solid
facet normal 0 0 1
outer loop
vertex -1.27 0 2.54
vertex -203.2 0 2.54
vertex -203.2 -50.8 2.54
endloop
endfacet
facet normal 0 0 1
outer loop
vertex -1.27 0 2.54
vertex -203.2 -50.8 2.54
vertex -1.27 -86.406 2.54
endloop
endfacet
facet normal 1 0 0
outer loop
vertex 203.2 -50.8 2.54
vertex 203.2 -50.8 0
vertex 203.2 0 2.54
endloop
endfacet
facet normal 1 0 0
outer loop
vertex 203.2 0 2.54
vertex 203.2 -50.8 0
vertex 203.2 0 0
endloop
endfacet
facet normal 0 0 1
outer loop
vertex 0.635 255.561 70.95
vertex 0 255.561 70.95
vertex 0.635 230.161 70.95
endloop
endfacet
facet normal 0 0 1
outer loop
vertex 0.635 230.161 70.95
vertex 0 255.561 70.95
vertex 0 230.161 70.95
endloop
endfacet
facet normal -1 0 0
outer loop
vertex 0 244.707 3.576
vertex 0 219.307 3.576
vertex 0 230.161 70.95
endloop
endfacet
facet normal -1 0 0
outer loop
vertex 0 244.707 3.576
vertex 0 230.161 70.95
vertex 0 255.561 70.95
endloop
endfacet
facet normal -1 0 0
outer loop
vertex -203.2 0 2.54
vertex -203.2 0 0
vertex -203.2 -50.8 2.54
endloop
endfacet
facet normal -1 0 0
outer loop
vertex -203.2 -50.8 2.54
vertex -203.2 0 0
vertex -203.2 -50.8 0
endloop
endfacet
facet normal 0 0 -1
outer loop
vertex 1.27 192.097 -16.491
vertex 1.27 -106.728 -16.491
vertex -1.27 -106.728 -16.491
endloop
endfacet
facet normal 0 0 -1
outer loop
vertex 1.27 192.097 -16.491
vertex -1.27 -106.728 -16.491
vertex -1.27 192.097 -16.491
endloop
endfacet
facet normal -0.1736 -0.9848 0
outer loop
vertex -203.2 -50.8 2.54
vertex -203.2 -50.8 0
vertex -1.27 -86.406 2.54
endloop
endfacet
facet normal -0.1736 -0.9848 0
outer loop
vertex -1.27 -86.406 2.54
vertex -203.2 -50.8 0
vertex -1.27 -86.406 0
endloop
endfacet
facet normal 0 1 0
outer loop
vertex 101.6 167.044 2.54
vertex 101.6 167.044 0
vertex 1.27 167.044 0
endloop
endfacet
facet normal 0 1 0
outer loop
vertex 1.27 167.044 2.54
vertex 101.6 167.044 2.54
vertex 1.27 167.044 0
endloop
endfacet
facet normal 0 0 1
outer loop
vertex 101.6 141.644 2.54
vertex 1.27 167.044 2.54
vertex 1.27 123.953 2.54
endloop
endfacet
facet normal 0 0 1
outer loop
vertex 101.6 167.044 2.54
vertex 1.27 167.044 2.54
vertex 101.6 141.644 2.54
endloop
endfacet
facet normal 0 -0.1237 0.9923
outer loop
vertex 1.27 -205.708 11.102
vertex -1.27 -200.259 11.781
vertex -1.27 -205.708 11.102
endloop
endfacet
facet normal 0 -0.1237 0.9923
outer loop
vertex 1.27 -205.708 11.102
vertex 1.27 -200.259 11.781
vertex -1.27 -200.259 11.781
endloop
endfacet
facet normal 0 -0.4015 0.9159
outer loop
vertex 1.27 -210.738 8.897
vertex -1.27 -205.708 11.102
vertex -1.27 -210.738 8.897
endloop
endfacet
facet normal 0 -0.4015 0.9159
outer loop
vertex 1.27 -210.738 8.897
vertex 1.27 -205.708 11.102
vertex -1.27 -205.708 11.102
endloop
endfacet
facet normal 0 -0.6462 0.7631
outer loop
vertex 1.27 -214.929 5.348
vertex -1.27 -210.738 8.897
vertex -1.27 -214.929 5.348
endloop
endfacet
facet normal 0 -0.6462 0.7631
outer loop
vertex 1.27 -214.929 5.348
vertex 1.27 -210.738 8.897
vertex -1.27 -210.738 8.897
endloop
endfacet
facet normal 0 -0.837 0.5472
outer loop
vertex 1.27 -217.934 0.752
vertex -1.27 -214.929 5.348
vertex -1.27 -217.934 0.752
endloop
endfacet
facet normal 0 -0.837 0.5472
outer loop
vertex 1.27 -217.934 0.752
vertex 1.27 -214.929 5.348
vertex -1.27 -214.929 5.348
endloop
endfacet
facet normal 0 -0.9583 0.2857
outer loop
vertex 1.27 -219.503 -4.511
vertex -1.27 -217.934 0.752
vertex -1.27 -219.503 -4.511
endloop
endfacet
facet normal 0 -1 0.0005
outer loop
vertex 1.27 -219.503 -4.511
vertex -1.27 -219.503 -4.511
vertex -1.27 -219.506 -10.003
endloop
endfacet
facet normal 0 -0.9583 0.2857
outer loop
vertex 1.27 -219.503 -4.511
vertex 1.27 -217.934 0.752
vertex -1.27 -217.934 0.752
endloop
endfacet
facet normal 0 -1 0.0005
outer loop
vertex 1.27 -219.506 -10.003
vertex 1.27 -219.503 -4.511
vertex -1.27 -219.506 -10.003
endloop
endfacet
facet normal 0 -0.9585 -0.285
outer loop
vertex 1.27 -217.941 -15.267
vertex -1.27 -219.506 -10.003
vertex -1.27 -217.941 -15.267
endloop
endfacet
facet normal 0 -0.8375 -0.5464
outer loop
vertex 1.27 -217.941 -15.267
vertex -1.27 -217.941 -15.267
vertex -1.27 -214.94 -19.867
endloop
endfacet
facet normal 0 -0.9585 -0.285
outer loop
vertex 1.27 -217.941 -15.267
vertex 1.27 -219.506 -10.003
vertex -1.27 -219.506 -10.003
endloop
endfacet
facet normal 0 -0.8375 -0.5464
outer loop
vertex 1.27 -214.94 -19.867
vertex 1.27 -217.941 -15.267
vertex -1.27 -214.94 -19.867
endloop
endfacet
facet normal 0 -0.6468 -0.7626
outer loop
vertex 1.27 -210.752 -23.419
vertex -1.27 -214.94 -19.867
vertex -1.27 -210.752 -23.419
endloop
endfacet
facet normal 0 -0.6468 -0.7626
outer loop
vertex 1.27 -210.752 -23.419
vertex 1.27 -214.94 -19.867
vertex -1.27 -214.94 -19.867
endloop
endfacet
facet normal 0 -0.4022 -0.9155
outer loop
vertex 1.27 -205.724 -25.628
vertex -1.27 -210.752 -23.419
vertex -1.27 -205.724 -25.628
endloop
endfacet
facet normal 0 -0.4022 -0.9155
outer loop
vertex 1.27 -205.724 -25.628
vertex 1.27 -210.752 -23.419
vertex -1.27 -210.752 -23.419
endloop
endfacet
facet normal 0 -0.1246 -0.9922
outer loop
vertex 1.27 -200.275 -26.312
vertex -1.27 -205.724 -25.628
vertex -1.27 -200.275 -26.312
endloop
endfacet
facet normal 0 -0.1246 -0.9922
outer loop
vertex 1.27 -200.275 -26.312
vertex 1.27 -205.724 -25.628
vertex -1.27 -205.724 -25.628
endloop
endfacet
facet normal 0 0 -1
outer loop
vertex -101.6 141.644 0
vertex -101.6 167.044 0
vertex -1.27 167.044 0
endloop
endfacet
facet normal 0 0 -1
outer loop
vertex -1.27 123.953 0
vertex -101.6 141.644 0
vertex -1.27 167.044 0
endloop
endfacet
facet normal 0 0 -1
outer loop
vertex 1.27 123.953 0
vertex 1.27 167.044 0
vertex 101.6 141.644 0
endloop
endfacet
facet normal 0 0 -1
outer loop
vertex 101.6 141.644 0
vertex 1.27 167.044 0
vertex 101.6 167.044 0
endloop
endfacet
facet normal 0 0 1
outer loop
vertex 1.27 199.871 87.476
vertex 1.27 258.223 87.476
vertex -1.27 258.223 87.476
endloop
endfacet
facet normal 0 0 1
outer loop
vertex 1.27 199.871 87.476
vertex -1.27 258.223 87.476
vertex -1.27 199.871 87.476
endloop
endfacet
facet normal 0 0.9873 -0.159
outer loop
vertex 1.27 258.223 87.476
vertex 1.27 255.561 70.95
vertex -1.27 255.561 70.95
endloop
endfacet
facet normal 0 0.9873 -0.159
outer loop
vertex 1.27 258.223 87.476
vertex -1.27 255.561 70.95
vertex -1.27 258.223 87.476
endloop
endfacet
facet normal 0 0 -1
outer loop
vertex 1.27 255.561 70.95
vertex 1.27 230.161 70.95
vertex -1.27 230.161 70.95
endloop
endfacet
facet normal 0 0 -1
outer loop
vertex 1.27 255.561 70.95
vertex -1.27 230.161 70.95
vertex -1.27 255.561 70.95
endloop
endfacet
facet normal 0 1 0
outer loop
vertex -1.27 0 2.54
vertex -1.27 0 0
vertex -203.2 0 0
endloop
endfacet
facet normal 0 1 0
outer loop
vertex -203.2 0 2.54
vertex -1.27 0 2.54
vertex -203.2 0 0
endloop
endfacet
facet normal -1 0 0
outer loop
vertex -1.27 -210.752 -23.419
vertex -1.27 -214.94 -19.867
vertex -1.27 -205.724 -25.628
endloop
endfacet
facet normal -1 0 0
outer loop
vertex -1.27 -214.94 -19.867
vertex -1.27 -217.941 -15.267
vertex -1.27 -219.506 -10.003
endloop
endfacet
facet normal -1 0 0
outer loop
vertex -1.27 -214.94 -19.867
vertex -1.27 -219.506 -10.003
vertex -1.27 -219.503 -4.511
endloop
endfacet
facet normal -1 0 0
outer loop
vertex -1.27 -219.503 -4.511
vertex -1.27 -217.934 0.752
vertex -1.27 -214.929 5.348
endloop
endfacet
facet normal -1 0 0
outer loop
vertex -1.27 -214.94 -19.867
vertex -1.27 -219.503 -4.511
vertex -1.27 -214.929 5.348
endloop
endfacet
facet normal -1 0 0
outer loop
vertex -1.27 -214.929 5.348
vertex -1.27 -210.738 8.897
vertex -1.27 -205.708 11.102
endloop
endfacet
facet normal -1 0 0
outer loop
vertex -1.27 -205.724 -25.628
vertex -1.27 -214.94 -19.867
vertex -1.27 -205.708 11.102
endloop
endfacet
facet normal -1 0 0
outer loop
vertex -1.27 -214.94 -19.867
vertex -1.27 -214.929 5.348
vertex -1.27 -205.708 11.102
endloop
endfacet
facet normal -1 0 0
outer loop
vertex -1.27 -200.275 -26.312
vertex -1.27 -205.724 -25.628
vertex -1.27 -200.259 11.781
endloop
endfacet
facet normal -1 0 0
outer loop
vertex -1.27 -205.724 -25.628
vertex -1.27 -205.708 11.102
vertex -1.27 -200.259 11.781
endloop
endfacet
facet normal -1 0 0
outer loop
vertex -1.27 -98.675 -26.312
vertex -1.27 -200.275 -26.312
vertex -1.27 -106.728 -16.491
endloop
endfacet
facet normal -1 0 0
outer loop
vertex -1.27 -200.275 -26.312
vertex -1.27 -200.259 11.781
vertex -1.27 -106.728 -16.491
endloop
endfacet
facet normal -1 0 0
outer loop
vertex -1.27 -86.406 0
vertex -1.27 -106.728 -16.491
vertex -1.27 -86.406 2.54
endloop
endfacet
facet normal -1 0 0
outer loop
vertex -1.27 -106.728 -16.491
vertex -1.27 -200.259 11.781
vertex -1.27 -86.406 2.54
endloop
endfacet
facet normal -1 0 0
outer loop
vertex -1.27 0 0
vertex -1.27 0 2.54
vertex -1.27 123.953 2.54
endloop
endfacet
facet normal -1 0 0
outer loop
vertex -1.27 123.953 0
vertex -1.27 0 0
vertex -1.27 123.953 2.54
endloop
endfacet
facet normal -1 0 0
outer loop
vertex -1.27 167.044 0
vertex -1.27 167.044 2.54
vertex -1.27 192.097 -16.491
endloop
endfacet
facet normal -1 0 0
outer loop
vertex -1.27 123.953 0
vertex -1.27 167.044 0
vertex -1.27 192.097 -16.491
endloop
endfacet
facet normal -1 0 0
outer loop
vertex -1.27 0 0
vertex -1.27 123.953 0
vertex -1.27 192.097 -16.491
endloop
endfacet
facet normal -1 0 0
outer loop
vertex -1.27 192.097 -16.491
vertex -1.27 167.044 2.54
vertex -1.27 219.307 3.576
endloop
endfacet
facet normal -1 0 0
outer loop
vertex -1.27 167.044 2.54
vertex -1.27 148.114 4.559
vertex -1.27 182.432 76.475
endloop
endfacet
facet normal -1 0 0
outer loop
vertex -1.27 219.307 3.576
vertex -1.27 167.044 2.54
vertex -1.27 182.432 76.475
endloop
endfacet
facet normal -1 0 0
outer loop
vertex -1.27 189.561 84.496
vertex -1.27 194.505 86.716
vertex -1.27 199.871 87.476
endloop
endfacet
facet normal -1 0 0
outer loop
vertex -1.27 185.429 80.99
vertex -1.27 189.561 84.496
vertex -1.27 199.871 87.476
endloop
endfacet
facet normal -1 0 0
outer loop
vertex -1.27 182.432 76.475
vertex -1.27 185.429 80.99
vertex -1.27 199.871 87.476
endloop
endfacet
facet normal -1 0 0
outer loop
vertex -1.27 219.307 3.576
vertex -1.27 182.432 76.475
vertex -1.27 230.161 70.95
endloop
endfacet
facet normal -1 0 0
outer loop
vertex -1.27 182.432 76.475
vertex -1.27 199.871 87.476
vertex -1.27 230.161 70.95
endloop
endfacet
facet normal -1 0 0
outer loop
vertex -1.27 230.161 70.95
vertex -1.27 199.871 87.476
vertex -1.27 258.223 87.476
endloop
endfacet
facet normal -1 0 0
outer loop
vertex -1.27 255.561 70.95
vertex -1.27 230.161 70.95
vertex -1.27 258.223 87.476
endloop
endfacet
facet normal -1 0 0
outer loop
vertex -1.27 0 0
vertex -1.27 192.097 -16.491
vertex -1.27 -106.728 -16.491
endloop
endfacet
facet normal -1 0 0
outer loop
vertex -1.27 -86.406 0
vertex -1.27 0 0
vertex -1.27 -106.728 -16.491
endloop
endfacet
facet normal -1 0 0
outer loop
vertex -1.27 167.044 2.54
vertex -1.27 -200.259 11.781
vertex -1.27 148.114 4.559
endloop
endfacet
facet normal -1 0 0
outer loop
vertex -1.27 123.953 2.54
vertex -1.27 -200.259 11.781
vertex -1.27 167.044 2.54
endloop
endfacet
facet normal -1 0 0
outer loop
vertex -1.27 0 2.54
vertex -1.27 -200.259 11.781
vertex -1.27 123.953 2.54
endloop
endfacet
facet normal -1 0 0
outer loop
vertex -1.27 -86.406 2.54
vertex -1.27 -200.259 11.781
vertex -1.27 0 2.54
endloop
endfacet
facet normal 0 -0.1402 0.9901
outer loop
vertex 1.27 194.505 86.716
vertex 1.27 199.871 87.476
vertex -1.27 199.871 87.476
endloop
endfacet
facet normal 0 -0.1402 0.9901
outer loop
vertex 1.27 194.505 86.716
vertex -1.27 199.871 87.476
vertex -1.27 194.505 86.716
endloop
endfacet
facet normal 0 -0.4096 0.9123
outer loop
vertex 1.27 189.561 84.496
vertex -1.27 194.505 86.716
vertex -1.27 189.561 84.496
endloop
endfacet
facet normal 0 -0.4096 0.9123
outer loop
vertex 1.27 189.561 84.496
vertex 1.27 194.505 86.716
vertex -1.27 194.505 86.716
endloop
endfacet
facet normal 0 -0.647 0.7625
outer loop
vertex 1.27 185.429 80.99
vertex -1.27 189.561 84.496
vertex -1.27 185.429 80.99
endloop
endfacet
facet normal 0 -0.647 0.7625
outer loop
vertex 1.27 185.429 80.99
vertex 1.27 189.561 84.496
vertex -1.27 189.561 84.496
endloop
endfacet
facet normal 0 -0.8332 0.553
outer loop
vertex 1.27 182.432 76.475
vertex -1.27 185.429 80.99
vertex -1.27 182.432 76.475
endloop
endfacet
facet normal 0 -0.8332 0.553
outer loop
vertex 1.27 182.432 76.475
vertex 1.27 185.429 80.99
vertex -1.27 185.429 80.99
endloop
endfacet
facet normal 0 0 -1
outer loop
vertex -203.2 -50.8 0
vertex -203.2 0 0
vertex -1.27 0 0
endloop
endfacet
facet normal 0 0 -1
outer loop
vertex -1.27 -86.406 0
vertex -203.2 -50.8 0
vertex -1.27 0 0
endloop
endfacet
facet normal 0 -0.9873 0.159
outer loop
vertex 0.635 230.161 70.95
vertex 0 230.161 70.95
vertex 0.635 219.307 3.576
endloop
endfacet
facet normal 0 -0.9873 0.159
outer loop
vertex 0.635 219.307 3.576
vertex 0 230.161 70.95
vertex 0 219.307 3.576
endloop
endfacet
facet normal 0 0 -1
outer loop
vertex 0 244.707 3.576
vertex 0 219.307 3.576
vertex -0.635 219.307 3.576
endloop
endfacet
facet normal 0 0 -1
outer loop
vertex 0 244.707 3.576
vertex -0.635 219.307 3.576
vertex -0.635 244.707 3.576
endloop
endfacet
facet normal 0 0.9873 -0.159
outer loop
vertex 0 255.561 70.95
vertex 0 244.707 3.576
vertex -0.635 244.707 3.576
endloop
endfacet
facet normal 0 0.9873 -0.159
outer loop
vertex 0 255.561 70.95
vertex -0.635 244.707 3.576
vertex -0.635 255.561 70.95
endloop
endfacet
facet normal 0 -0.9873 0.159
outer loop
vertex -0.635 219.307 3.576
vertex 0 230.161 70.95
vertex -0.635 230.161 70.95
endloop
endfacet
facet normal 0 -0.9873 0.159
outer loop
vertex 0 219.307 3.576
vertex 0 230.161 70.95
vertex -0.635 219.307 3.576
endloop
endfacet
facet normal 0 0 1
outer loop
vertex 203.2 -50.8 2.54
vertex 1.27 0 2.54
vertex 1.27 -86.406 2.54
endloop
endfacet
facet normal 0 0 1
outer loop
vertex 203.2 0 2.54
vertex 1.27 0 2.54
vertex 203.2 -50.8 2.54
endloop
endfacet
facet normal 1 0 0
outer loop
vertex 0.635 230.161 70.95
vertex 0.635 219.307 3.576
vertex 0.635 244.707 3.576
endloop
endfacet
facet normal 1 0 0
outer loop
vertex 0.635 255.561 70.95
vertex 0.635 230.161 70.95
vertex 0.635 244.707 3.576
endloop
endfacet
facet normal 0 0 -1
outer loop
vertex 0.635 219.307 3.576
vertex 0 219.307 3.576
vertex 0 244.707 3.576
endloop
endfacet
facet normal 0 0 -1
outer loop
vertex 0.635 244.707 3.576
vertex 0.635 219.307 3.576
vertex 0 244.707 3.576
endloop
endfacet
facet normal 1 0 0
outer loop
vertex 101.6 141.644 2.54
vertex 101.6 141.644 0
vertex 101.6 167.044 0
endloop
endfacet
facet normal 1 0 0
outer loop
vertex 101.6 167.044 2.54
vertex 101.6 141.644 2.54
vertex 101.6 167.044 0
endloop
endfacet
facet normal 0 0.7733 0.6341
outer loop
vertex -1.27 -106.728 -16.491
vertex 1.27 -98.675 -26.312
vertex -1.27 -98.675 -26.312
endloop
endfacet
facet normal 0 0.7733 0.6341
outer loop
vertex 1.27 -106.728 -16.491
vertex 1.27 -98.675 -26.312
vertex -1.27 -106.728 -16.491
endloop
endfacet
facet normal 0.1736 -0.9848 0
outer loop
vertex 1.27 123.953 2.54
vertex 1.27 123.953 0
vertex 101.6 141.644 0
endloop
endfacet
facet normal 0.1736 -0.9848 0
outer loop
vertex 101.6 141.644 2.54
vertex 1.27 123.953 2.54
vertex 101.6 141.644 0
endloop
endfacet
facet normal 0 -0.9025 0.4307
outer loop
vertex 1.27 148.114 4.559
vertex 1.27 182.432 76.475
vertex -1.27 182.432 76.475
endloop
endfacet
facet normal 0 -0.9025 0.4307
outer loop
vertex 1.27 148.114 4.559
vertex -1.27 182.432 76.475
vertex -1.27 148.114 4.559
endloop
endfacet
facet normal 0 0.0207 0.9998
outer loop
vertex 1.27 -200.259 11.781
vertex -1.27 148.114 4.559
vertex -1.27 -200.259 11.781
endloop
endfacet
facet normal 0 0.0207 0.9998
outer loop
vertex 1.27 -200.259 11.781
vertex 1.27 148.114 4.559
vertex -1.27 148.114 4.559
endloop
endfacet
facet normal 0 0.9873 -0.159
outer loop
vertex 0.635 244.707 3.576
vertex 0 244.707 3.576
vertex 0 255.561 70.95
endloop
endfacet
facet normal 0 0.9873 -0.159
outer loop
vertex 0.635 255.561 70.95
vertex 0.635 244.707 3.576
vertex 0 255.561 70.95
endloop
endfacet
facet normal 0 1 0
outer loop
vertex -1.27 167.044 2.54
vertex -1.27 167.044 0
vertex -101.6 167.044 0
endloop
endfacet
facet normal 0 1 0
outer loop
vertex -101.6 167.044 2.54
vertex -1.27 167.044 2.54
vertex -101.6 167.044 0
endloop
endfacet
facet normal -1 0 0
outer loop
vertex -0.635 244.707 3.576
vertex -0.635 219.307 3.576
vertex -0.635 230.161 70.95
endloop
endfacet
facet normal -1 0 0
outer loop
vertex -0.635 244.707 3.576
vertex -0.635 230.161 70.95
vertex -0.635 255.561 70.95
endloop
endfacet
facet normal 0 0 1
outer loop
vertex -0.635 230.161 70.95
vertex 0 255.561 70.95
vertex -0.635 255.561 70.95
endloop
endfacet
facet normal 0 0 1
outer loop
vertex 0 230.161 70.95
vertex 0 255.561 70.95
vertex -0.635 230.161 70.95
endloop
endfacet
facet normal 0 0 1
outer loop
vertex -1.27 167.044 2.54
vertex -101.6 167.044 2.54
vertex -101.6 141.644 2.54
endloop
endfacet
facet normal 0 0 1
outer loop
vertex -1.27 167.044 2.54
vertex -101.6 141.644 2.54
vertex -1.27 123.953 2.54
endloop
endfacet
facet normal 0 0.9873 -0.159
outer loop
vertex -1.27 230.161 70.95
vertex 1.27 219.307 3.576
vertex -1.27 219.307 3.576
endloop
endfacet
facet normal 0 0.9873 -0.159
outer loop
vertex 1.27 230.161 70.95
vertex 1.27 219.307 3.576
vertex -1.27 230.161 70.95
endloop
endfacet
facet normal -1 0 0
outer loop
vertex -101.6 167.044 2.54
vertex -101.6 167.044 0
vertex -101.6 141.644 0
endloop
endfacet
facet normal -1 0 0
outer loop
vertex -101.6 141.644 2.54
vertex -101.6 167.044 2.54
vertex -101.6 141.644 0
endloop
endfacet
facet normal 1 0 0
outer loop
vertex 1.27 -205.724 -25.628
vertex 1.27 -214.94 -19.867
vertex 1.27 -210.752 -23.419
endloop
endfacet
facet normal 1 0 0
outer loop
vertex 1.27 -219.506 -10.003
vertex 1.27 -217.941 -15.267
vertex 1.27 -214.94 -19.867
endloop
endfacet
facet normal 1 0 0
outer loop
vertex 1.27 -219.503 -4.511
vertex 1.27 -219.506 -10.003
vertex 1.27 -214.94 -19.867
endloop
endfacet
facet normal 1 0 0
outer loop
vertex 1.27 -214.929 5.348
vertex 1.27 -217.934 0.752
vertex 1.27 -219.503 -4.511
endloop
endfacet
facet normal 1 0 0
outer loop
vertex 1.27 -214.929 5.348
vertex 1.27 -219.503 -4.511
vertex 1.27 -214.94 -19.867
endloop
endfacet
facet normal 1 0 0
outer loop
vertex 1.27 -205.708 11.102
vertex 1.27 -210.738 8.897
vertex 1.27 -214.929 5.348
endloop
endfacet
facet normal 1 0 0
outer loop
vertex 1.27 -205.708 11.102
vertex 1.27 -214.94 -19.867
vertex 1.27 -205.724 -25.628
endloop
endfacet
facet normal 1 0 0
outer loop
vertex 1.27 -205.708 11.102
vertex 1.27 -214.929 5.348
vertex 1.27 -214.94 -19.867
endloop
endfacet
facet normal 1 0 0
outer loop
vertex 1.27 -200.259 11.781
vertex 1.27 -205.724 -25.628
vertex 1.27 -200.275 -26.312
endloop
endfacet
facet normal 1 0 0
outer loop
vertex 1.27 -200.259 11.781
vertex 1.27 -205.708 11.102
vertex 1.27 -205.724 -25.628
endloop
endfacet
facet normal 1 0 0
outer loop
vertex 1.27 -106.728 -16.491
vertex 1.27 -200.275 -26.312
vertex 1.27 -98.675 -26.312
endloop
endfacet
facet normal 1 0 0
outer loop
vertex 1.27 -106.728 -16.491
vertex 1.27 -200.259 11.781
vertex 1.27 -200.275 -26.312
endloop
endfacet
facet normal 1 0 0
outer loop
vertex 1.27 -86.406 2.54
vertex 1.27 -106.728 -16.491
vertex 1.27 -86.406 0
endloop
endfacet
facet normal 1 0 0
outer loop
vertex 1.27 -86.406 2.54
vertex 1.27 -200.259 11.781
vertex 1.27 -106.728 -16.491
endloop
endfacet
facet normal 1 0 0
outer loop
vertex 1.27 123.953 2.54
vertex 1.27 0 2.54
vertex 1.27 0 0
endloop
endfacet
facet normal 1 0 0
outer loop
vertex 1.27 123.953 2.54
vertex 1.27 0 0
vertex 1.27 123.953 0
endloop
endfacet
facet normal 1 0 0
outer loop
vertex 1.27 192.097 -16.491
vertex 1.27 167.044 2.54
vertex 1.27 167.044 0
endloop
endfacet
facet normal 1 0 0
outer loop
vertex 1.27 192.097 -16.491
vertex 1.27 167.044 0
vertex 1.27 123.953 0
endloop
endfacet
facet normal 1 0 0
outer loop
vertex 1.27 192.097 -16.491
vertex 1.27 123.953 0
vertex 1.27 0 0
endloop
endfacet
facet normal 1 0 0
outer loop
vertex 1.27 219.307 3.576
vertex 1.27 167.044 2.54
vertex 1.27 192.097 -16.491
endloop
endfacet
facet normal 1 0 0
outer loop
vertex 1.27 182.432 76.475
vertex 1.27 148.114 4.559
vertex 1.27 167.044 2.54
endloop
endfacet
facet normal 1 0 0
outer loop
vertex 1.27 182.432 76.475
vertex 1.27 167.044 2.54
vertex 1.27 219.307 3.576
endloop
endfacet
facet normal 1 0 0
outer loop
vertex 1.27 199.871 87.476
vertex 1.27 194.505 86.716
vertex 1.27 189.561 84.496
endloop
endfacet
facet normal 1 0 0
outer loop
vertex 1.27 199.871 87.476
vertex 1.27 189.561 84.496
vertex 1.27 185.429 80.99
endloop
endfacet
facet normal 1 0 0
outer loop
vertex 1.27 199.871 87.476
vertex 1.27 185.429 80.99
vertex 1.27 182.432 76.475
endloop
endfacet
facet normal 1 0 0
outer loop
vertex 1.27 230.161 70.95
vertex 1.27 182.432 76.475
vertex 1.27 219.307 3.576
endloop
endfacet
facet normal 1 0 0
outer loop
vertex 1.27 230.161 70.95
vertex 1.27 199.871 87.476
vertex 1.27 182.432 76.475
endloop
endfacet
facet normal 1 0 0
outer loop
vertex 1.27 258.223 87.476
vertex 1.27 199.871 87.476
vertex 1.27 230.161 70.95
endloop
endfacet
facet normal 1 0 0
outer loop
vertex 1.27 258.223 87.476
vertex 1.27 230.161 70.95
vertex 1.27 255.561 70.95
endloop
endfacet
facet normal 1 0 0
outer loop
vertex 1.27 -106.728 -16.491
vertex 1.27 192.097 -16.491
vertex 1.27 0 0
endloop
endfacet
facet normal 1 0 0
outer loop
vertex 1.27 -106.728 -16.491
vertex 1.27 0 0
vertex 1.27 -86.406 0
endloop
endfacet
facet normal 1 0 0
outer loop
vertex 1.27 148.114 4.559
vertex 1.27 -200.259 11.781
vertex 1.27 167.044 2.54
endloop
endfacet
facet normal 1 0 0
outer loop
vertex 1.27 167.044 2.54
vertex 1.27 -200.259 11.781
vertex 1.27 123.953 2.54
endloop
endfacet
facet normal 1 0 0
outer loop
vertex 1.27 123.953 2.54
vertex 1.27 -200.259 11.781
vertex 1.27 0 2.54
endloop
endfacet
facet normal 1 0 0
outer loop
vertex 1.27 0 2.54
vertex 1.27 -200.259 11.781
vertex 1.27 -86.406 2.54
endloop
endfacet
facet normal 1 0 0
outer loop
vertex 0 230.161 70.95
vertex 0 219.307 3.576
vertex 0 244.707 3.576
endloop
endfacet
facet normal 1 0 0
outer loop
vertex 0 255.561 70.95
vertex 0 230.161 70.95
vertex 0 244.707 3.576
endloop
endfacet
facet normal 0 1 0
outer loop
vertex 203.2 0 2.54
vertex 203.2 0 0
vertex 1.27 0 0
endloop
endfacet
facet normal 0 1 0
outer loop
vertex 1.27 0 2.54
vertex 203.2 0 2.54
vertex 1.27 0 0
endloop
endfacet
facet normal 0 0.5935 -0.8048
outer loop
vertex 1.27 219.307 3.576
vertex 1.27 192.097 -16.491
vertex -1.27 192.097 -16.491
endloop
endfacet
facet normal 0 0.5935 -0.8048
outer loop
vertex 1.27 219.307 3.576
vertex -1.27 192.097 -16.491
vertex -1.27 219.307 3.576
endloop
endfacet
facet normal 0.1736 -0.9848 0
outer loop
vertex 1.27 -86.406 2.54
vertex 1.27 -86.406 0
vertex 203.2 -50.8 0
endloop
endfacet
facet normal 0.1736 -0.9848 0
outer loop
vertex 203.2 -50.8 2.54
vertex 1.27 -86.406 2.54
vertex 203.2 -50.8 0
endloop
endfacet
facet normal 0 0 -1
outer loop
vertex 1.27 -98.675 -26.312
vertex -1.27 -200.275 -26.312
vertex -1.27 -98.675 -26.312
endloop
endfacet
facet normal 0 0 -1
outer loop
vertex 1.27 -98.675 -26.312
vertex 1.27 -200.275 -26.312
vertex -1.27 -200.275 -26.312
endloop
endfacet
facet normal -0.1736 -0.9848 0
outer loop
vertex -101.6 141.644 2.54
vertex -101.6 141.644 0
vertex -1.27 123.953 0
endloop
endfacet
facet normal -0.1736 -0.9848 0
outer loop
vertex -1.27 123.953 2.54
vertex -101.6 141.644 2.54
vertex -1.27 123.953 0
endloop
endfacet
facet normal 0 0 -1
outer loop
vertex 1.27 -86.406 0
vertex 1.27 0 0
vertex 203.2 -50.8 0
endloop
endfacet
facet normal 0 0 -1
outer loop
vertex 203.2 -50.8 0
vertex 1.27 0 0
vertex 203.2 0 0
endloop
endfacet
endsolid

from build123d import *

# Parameters (mm, degrees)
F1_DEPTH = 1.27
F3_DEPTH = 0.635
F6_DEPTH = 2.54
F8_DEPTH = 2.54


with BuildPart() as f1:
    # F0 (on Right) → F1 (new body)
    with BuildSketch(Plane.YZ):
        with BuildLine():
            ThreePointArc((-200.258537, 11.780631), (-187.044089, 6.064791), (-181.603342, -7.265277))
            ThreePointArc((-181.603342, -7.265277), (-187.049753, -20.601126), (-200.274718, -26.311514))
            Line((-200.274718, -26.311514), (-98.674718, -26.311514))
            Line((-98.674718, -26.311514), (-106.728071, -16.491458))
            Line((-106.728071, -16.491458), (192.096516, -16.491458))
            Line((192.096516, -16.491458), (219.306946, 3.576297))
            Line((219.306946, 3.576297), (230.160994, 70.95023))
            Line((230.160994, 70.95023), (255.560994, 70.95023))
            Line((255.560994, 70.95023), (258.223286, 87.475775))
            Line((258.223286, 87.475775), (199.871009, 87.475775))
            ThreePointArc((199.871009, 87.475775), (189.561421, 84.495684), (182.431828, 76.47462))
            Line((182.431828, 76.47462), (148.114353, 4.559168))
            Line((148.114353, 4.559168), (-200.258537, 11.780631))
        make_face()
        with BuildLine():
            ThreePointArc((-200.274718, -26.311514), (-187.049753, -20.601126), (-181.603342, -7.265277))
            ThreePointArc((-181.603342, -7.265277), (-187.044089, 6.064791), (-200.258537, 11.780631))
            ThreePointArc((-200.258537, 11.780631), (-219.70334, -7.257185), (-200.274718, -26.311514))
        make_face()
    extrude(amount=F1_DEPTH)

    # F2: F1 across plane


with BuildPart() as f1_1:
    add(f1.part)
    add(f1.part.mirror(Plane.YZ))

    # F5 (on Top) → F6 (join)
    with BuildSketch(Plane.XY):
        Polygon((203.2, 0), (0, 0), (-203.2, 0), (-203.2, -50.8), (0, -86.629642), (203.2, -50.8), align=None)
    extrude(amount=F6_DEPTH)

    # F7 (on Top) → F8 (join)
    with BuildSketch(Plane.XY):
        Polygon((101.6, 167.04415), (0, 167.04415), (-101.6, 167.04415), (-101.6, 141.64415), (0, 123.729329), (101.6, 141.64415), align=None)
    extrude(amount=F8_DEPTH)


with BuildPart() as f3:
    # F0 (on Right) → F3 (new body)
    with BuildSketch(Plane.YZ):
        Polygon((230.160994, 70.95023), (219.306946, 3.576297), (244.706946, 3.576297), (255.560994, 70.95023), align=None)
    extrude(amount=F3_DEPTH)


with BuildPart() as f4_1:
    # F4: instance of F3
    add(f3.part.mirror(Plane.YZ))


solid = Compound([f1_1.part, f3.part, f4_1.part])
